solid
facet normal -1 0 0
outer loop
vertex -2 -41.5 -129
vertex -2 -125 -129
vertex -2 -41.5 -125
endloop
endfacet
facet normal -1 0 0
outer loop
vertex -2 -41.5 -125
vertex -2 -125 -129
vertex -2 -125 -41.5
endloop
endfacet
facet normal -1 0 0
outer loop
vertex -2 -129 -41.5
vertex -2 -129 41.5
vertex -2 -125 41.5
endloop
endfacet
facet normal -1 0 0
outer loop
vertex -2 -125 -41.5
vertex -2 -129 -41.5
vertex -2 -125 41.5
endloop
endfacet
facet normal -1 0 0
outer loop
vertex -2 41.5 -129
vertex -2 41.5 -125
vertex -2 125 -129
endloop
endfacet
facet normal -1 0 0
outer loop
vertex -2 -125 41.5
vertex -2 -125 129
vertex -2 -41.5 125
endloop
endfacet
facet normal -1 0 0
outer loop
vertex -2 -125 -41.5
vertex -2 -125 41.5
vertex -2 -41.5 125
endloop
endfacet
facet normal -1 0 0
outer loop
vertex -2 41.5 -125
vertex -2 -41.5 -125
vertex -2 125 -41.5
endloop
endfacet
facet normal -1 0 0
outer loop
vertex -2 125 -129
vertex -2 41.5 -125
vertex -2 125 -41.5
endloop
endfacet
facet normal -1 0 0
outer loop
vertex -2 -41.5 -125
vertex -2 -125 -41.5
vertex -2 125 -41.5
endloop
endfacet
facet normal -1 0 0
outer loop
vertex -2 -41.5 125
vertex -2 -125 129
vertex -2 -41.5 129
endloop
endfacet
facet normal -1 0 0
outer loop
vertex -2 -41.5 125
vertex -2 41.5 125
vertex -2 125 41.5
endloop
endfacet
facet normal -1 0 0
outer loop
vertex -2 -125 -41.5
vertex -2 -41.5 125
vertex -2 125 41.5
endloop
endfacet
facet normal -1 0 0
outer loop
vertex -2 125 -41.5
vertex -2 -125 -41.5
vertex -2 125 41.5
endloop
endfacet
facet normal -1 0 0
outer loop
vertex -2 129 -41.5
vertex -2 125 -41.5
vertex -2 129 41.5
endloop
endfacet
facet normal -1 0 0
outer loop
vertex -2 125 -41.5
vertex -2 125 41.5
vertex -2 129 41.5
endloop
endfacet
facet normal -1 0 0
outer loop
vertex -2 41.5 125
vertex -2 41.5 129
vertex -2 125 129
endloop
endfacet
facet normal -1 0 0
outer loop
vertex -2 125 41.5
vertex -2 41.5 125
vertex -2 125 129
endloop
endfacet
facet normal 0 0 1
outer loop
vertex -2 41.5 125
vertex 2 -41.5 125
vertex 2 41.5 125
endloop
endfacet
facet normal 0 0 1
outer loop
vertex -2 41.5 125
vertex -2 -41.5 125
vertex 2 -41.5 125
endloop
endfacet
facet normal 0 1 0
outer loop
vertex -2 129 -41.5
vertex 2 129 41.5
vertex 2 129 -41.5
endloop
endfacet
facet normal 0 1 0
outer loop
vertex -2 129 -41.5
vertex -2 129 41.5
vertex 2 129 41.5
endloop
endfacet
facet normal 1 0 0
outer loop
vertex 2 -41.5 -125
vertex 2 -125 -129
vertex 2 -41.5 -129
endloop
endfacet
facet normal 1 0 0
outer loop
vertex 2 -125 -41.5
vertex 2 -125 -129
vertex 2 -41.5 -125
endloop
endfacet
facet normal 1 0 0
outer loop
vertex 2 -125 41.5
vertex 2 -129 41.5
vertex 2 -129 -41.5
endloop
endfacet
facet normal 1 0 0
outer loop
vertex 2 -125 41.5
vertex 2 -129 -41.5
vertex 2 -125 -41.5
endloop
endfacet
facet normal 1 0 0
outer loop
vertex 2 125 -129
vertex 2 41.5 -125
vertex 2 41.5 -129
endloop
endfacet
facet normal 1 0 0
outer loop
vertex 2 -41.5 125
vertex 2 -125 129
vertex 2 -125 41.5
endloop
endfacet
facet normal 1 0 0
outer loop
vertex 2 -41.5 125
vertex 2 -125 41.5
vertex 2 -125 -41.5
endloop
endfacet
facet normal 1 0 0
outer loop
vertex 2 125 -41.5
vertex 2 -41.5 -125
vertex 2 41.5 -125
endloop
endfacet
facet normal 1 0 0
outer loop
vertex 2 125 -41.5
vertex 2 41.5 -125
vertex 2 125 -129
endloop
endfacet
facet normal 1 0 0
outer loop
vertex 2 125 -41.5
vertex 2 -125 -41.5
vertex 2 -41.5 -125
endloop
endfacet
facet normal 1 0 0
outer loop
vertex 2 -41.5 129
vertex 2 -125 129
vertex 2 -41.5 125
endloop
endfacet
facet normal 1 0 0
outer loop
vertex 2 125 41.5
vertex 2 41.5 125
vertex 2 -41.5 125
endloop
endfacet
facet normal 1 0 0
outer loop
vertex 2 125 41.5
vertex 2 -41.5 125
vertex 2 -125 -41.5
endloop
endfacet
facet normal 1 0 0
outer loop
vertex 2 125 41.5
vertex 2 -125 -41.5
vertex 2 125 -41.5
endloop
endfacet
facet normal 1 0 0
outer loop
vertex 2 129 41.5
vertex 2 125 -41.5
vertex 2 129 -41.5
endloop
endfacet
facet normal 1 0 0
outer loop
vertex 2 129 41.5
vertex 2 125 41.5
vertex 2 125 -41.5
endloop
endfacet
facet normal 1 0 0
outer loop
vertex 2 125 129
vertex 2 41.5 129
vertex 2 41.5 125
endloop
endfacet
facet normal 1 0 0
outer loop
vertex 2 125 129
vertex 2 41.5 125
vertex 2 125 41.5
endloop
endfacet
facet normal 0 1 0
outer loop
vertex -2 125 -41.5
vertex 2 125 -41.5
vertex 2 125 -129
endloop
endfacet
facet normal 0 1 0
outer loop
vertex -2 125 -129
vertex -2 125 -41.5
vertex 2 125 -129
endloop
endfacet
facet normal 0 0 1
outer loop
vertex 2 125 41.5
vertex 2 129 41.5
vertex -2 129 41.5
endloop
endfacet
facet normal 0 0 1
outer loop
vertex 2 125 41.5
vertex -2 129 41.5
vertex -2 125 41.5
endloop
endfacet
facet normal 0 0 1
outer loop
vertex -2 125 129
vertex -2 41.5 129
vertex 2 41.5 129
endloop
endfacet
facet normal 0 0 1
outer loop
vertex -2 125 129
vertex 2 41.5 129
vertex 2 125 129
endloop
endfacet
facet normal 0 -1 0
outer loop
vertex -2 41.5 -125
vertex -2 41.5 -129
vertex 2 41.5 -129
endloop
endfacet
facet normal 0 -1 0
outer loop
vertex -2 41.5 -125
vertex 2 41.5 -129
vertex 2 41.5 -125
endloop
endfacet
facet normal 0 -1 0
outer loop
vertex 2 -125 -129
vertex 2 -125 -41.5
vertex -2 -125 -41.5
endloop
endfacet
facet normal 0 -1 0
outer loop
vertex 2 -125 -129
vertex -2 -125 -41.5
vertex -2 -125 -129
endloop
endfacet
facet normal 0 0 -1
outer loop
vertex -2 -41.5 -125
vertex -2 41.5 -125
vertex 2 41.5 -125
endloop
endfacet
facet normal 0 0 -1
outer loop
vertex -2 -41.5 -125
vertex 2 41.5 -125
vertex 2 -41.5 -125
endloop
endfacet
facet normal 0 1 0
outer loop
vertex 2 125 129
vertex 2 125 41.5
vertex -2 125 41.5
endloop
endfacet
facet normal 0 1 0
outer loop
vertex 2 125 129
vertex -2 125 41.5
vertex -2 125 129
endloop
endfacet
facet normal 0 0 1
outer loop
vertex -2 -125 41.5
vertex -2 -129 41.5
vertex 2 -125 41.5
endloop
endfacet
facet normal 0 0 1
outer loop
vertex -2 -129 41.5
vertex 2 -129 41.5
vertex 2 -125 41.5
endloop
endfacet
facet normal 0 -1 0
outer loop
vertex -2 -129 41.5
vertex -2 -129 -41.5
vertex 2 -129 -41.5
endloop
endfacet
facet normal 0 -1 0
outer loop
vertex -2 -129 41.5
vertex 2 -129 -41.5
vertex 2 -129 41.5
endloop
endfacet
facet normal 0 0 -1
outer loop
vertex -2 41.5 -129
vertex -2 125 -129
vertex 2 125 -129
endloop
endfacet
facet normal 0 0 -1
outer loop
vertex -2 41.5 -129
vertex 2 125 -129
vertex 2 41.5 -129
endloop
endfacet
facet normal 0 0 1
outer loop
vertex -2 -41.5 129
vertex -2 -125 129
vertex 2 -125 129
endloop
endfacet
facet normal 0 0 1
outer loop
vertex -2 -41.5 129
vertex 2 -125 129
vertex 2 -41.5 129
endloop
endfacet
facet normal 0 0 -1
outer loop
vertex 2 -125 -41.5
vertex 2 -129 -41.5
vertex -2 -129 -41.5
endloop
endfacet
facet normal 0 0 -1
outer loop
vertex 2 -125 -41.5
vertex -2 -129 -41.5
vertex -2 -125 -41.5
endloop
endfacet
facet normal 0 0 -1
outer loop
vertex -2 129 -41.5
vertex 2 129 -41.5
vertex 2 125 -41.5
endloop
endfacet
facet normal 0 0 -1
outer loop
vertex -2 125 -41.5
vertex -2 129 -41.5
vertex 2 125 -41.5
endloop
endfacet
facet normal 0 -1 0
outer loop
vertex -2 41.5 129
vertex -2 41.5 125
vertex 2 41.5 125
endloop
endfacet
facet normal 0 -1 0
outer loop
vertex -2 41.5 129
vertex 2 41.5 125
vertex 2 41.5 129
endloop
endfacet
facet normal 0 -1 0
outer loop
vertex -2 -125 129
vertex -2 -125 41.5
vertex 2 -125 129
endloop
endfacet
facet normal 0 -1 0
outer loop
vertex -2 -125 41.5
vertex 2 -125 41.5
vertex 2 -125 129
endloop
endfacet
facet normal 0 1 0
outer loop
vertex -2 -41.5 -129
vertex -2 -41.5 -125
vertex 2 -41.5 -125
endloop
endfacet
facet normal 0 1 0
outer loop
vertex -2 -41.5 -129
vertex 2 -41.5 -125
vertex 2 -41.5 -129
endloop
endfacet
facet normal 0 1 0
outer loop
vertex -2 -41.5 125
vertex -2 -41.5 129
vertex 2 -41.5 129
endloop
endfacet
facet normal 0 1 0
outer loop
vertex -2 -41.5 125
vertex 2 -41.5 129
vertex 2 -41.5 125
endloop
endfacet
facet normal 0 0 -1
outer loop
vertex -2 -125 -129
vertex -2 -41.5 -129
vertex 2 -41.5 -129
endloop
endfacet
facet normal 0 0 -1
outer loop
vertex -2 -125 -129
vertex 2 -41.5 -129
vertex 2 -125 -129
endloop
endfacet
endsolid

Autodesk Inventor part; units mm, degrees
ref_plane "YZ Plane" through (0, 0, 0) normal (1, 0, 0) x (0, 1, 0)
ref_plane "XZ Plane" through (0, 0, 0) normal (0, 1, 0) x (-1, 0, 0)
ref_plane "XY Plane" through (0, 0, 0) normal (0, 0, 1) x (1, 0, 0)
sketch "Esboço1" plane through (0, 0, 0) normal (1, 0, 0) x (0, 1, 0)
  line L0 (-129, 129) -> (129, 129)
  line L1 (129, 129) -> (129, -129)
  line L2 (129, -129) -> (-129, -129)
  line L3 (-129, -129) -> (-129, 129)
  line L4 (-129, 129) -> (129, -129) construction
  line L5 (129, 129) -> (-129, -129) construction
  point P0 (0, 0)
  dimension "d0" = 258
  dimension "d1" = 258
extrude "Extrusão1" add sketch "Esboço1" along normal mid plane 4
sketch "Esboço2" plane through (2, 0, 0) normal (1, 0, 0) x (0, 0, -1)
  line L0 (129, 129) -> (-129, 129) projected
  line L1 (-129, 129) -> (-41.5, 129)
  line L2 (-41.5, 129) -> (-41.5, 125)
  line L3 (-41.5, 125) -> (-129, 125)
  line L4 (-129, 125) -> (-129, 129)
  line L5 (129, 129) -> (41.5, 129)
  line L6 (41.5, 129) -> (41.5, 125)
  line L7 (41.5, 125) -> (129, 125)
  line L8 (129, 125) -> (129, 129)
  line L9 (-129, 129) -> (-129, -129) projected
  line L10 (-129, -129) -> (-41.5, -129)
  line L11 (-41.5, -129) -> (-41.5, -125)
  line L12 (-41.5, -125) -> (-129, -125)
  line L13 (-129, -125) -> (-129, -129)
  line L14 (129, -129) -> (129, 129) projected
  line L15 (129, -129) -> (41.5, -129)
  line L16 (41.5, -129) -> (41.5, -125)
  line L17 (41.5, -125) -> (129, -125)
  line L18 (129, -125) -> (129, -129)
  point P0 (0, 0)
  point P1 (129, -125)
  dimension "d4" = 87.5
  dimension "d5" = 4
  dimension "d6" = 87.5
  dimension "d7" = 4
  dimension "d8" = 83
  dimension "d9" = 87.5
  dimension "d10" = 4
  dimension "d11" = 87.5
  dimension "d12" = 4
  dimension "d13" = 83
extrude "Extrusão2" cut sketch "Esboço2" along normal through all both and the other way through all
sketch "Esboço3" plane through (2, 0, 0) normal (1, 0, 0) x (0, 0, -1)
  line L0 (-125, 41.5) -> (-133, 41.5)
  line L1 (-133, 41.5) -> (-133, -41.5)
  line L2 (-133, -41.5) -> (-125, -41.5)
  line L3 (-125, -41.5) -> (-125, 41.5)
  line L4 (-129, -125) -> (-129, 125) projected
  line L5 (-125, 41.5) -> (-133, -41.5) construction
  line L6 (-133, 41.5) -> (-125, -41.5) construction
  line L7 (125, -41.5) -> (133, -41.5)
  line L8 (133, -41.5) -> (133, 41.5)
  line L9 (133, 41.5) -> (125, 41.5)
  line L10 (125, 41.5) -> (125, -41.5)
  line L11 (129, 125) -> (129, -125) projected
  line L12 (125, -41.5) -> (133, 41.5) construction
  line L13 (133, -41.5) -> (125, 41.5) construction
  line L14 (-41.5, 125) -> (-129, 125) projected
  line L15 (-129, -125) -> (-41.5, -125) projected
  line L16 (129, 125) -> (41.5, 125) projected
  line L17 (41.5, -125) -> (129, -125) projected
  point P0 (0, 0)
  point P1 (-129, 0)
  point P2 (129, 0)
  dimension "d16" = 83
  dimension "d17" = 8
  dimension "d18" = 8
  dimension "d19" = 83
  dimension "d20" = 83.5
  dimension "d21" = 83.5
  dimension "d22" = 83.5
  dimension "d23" = 83.5
extrude "Extrusão3" cut sketch "Esboço3" along normal through all both and the other way through all
sketch "Esboço4" plane through (2, 0, 0) normal (1, 0, 0) x (0, 0, -1)
  point P0 (0, 0)
properties part number "FUNDO POÇO"
